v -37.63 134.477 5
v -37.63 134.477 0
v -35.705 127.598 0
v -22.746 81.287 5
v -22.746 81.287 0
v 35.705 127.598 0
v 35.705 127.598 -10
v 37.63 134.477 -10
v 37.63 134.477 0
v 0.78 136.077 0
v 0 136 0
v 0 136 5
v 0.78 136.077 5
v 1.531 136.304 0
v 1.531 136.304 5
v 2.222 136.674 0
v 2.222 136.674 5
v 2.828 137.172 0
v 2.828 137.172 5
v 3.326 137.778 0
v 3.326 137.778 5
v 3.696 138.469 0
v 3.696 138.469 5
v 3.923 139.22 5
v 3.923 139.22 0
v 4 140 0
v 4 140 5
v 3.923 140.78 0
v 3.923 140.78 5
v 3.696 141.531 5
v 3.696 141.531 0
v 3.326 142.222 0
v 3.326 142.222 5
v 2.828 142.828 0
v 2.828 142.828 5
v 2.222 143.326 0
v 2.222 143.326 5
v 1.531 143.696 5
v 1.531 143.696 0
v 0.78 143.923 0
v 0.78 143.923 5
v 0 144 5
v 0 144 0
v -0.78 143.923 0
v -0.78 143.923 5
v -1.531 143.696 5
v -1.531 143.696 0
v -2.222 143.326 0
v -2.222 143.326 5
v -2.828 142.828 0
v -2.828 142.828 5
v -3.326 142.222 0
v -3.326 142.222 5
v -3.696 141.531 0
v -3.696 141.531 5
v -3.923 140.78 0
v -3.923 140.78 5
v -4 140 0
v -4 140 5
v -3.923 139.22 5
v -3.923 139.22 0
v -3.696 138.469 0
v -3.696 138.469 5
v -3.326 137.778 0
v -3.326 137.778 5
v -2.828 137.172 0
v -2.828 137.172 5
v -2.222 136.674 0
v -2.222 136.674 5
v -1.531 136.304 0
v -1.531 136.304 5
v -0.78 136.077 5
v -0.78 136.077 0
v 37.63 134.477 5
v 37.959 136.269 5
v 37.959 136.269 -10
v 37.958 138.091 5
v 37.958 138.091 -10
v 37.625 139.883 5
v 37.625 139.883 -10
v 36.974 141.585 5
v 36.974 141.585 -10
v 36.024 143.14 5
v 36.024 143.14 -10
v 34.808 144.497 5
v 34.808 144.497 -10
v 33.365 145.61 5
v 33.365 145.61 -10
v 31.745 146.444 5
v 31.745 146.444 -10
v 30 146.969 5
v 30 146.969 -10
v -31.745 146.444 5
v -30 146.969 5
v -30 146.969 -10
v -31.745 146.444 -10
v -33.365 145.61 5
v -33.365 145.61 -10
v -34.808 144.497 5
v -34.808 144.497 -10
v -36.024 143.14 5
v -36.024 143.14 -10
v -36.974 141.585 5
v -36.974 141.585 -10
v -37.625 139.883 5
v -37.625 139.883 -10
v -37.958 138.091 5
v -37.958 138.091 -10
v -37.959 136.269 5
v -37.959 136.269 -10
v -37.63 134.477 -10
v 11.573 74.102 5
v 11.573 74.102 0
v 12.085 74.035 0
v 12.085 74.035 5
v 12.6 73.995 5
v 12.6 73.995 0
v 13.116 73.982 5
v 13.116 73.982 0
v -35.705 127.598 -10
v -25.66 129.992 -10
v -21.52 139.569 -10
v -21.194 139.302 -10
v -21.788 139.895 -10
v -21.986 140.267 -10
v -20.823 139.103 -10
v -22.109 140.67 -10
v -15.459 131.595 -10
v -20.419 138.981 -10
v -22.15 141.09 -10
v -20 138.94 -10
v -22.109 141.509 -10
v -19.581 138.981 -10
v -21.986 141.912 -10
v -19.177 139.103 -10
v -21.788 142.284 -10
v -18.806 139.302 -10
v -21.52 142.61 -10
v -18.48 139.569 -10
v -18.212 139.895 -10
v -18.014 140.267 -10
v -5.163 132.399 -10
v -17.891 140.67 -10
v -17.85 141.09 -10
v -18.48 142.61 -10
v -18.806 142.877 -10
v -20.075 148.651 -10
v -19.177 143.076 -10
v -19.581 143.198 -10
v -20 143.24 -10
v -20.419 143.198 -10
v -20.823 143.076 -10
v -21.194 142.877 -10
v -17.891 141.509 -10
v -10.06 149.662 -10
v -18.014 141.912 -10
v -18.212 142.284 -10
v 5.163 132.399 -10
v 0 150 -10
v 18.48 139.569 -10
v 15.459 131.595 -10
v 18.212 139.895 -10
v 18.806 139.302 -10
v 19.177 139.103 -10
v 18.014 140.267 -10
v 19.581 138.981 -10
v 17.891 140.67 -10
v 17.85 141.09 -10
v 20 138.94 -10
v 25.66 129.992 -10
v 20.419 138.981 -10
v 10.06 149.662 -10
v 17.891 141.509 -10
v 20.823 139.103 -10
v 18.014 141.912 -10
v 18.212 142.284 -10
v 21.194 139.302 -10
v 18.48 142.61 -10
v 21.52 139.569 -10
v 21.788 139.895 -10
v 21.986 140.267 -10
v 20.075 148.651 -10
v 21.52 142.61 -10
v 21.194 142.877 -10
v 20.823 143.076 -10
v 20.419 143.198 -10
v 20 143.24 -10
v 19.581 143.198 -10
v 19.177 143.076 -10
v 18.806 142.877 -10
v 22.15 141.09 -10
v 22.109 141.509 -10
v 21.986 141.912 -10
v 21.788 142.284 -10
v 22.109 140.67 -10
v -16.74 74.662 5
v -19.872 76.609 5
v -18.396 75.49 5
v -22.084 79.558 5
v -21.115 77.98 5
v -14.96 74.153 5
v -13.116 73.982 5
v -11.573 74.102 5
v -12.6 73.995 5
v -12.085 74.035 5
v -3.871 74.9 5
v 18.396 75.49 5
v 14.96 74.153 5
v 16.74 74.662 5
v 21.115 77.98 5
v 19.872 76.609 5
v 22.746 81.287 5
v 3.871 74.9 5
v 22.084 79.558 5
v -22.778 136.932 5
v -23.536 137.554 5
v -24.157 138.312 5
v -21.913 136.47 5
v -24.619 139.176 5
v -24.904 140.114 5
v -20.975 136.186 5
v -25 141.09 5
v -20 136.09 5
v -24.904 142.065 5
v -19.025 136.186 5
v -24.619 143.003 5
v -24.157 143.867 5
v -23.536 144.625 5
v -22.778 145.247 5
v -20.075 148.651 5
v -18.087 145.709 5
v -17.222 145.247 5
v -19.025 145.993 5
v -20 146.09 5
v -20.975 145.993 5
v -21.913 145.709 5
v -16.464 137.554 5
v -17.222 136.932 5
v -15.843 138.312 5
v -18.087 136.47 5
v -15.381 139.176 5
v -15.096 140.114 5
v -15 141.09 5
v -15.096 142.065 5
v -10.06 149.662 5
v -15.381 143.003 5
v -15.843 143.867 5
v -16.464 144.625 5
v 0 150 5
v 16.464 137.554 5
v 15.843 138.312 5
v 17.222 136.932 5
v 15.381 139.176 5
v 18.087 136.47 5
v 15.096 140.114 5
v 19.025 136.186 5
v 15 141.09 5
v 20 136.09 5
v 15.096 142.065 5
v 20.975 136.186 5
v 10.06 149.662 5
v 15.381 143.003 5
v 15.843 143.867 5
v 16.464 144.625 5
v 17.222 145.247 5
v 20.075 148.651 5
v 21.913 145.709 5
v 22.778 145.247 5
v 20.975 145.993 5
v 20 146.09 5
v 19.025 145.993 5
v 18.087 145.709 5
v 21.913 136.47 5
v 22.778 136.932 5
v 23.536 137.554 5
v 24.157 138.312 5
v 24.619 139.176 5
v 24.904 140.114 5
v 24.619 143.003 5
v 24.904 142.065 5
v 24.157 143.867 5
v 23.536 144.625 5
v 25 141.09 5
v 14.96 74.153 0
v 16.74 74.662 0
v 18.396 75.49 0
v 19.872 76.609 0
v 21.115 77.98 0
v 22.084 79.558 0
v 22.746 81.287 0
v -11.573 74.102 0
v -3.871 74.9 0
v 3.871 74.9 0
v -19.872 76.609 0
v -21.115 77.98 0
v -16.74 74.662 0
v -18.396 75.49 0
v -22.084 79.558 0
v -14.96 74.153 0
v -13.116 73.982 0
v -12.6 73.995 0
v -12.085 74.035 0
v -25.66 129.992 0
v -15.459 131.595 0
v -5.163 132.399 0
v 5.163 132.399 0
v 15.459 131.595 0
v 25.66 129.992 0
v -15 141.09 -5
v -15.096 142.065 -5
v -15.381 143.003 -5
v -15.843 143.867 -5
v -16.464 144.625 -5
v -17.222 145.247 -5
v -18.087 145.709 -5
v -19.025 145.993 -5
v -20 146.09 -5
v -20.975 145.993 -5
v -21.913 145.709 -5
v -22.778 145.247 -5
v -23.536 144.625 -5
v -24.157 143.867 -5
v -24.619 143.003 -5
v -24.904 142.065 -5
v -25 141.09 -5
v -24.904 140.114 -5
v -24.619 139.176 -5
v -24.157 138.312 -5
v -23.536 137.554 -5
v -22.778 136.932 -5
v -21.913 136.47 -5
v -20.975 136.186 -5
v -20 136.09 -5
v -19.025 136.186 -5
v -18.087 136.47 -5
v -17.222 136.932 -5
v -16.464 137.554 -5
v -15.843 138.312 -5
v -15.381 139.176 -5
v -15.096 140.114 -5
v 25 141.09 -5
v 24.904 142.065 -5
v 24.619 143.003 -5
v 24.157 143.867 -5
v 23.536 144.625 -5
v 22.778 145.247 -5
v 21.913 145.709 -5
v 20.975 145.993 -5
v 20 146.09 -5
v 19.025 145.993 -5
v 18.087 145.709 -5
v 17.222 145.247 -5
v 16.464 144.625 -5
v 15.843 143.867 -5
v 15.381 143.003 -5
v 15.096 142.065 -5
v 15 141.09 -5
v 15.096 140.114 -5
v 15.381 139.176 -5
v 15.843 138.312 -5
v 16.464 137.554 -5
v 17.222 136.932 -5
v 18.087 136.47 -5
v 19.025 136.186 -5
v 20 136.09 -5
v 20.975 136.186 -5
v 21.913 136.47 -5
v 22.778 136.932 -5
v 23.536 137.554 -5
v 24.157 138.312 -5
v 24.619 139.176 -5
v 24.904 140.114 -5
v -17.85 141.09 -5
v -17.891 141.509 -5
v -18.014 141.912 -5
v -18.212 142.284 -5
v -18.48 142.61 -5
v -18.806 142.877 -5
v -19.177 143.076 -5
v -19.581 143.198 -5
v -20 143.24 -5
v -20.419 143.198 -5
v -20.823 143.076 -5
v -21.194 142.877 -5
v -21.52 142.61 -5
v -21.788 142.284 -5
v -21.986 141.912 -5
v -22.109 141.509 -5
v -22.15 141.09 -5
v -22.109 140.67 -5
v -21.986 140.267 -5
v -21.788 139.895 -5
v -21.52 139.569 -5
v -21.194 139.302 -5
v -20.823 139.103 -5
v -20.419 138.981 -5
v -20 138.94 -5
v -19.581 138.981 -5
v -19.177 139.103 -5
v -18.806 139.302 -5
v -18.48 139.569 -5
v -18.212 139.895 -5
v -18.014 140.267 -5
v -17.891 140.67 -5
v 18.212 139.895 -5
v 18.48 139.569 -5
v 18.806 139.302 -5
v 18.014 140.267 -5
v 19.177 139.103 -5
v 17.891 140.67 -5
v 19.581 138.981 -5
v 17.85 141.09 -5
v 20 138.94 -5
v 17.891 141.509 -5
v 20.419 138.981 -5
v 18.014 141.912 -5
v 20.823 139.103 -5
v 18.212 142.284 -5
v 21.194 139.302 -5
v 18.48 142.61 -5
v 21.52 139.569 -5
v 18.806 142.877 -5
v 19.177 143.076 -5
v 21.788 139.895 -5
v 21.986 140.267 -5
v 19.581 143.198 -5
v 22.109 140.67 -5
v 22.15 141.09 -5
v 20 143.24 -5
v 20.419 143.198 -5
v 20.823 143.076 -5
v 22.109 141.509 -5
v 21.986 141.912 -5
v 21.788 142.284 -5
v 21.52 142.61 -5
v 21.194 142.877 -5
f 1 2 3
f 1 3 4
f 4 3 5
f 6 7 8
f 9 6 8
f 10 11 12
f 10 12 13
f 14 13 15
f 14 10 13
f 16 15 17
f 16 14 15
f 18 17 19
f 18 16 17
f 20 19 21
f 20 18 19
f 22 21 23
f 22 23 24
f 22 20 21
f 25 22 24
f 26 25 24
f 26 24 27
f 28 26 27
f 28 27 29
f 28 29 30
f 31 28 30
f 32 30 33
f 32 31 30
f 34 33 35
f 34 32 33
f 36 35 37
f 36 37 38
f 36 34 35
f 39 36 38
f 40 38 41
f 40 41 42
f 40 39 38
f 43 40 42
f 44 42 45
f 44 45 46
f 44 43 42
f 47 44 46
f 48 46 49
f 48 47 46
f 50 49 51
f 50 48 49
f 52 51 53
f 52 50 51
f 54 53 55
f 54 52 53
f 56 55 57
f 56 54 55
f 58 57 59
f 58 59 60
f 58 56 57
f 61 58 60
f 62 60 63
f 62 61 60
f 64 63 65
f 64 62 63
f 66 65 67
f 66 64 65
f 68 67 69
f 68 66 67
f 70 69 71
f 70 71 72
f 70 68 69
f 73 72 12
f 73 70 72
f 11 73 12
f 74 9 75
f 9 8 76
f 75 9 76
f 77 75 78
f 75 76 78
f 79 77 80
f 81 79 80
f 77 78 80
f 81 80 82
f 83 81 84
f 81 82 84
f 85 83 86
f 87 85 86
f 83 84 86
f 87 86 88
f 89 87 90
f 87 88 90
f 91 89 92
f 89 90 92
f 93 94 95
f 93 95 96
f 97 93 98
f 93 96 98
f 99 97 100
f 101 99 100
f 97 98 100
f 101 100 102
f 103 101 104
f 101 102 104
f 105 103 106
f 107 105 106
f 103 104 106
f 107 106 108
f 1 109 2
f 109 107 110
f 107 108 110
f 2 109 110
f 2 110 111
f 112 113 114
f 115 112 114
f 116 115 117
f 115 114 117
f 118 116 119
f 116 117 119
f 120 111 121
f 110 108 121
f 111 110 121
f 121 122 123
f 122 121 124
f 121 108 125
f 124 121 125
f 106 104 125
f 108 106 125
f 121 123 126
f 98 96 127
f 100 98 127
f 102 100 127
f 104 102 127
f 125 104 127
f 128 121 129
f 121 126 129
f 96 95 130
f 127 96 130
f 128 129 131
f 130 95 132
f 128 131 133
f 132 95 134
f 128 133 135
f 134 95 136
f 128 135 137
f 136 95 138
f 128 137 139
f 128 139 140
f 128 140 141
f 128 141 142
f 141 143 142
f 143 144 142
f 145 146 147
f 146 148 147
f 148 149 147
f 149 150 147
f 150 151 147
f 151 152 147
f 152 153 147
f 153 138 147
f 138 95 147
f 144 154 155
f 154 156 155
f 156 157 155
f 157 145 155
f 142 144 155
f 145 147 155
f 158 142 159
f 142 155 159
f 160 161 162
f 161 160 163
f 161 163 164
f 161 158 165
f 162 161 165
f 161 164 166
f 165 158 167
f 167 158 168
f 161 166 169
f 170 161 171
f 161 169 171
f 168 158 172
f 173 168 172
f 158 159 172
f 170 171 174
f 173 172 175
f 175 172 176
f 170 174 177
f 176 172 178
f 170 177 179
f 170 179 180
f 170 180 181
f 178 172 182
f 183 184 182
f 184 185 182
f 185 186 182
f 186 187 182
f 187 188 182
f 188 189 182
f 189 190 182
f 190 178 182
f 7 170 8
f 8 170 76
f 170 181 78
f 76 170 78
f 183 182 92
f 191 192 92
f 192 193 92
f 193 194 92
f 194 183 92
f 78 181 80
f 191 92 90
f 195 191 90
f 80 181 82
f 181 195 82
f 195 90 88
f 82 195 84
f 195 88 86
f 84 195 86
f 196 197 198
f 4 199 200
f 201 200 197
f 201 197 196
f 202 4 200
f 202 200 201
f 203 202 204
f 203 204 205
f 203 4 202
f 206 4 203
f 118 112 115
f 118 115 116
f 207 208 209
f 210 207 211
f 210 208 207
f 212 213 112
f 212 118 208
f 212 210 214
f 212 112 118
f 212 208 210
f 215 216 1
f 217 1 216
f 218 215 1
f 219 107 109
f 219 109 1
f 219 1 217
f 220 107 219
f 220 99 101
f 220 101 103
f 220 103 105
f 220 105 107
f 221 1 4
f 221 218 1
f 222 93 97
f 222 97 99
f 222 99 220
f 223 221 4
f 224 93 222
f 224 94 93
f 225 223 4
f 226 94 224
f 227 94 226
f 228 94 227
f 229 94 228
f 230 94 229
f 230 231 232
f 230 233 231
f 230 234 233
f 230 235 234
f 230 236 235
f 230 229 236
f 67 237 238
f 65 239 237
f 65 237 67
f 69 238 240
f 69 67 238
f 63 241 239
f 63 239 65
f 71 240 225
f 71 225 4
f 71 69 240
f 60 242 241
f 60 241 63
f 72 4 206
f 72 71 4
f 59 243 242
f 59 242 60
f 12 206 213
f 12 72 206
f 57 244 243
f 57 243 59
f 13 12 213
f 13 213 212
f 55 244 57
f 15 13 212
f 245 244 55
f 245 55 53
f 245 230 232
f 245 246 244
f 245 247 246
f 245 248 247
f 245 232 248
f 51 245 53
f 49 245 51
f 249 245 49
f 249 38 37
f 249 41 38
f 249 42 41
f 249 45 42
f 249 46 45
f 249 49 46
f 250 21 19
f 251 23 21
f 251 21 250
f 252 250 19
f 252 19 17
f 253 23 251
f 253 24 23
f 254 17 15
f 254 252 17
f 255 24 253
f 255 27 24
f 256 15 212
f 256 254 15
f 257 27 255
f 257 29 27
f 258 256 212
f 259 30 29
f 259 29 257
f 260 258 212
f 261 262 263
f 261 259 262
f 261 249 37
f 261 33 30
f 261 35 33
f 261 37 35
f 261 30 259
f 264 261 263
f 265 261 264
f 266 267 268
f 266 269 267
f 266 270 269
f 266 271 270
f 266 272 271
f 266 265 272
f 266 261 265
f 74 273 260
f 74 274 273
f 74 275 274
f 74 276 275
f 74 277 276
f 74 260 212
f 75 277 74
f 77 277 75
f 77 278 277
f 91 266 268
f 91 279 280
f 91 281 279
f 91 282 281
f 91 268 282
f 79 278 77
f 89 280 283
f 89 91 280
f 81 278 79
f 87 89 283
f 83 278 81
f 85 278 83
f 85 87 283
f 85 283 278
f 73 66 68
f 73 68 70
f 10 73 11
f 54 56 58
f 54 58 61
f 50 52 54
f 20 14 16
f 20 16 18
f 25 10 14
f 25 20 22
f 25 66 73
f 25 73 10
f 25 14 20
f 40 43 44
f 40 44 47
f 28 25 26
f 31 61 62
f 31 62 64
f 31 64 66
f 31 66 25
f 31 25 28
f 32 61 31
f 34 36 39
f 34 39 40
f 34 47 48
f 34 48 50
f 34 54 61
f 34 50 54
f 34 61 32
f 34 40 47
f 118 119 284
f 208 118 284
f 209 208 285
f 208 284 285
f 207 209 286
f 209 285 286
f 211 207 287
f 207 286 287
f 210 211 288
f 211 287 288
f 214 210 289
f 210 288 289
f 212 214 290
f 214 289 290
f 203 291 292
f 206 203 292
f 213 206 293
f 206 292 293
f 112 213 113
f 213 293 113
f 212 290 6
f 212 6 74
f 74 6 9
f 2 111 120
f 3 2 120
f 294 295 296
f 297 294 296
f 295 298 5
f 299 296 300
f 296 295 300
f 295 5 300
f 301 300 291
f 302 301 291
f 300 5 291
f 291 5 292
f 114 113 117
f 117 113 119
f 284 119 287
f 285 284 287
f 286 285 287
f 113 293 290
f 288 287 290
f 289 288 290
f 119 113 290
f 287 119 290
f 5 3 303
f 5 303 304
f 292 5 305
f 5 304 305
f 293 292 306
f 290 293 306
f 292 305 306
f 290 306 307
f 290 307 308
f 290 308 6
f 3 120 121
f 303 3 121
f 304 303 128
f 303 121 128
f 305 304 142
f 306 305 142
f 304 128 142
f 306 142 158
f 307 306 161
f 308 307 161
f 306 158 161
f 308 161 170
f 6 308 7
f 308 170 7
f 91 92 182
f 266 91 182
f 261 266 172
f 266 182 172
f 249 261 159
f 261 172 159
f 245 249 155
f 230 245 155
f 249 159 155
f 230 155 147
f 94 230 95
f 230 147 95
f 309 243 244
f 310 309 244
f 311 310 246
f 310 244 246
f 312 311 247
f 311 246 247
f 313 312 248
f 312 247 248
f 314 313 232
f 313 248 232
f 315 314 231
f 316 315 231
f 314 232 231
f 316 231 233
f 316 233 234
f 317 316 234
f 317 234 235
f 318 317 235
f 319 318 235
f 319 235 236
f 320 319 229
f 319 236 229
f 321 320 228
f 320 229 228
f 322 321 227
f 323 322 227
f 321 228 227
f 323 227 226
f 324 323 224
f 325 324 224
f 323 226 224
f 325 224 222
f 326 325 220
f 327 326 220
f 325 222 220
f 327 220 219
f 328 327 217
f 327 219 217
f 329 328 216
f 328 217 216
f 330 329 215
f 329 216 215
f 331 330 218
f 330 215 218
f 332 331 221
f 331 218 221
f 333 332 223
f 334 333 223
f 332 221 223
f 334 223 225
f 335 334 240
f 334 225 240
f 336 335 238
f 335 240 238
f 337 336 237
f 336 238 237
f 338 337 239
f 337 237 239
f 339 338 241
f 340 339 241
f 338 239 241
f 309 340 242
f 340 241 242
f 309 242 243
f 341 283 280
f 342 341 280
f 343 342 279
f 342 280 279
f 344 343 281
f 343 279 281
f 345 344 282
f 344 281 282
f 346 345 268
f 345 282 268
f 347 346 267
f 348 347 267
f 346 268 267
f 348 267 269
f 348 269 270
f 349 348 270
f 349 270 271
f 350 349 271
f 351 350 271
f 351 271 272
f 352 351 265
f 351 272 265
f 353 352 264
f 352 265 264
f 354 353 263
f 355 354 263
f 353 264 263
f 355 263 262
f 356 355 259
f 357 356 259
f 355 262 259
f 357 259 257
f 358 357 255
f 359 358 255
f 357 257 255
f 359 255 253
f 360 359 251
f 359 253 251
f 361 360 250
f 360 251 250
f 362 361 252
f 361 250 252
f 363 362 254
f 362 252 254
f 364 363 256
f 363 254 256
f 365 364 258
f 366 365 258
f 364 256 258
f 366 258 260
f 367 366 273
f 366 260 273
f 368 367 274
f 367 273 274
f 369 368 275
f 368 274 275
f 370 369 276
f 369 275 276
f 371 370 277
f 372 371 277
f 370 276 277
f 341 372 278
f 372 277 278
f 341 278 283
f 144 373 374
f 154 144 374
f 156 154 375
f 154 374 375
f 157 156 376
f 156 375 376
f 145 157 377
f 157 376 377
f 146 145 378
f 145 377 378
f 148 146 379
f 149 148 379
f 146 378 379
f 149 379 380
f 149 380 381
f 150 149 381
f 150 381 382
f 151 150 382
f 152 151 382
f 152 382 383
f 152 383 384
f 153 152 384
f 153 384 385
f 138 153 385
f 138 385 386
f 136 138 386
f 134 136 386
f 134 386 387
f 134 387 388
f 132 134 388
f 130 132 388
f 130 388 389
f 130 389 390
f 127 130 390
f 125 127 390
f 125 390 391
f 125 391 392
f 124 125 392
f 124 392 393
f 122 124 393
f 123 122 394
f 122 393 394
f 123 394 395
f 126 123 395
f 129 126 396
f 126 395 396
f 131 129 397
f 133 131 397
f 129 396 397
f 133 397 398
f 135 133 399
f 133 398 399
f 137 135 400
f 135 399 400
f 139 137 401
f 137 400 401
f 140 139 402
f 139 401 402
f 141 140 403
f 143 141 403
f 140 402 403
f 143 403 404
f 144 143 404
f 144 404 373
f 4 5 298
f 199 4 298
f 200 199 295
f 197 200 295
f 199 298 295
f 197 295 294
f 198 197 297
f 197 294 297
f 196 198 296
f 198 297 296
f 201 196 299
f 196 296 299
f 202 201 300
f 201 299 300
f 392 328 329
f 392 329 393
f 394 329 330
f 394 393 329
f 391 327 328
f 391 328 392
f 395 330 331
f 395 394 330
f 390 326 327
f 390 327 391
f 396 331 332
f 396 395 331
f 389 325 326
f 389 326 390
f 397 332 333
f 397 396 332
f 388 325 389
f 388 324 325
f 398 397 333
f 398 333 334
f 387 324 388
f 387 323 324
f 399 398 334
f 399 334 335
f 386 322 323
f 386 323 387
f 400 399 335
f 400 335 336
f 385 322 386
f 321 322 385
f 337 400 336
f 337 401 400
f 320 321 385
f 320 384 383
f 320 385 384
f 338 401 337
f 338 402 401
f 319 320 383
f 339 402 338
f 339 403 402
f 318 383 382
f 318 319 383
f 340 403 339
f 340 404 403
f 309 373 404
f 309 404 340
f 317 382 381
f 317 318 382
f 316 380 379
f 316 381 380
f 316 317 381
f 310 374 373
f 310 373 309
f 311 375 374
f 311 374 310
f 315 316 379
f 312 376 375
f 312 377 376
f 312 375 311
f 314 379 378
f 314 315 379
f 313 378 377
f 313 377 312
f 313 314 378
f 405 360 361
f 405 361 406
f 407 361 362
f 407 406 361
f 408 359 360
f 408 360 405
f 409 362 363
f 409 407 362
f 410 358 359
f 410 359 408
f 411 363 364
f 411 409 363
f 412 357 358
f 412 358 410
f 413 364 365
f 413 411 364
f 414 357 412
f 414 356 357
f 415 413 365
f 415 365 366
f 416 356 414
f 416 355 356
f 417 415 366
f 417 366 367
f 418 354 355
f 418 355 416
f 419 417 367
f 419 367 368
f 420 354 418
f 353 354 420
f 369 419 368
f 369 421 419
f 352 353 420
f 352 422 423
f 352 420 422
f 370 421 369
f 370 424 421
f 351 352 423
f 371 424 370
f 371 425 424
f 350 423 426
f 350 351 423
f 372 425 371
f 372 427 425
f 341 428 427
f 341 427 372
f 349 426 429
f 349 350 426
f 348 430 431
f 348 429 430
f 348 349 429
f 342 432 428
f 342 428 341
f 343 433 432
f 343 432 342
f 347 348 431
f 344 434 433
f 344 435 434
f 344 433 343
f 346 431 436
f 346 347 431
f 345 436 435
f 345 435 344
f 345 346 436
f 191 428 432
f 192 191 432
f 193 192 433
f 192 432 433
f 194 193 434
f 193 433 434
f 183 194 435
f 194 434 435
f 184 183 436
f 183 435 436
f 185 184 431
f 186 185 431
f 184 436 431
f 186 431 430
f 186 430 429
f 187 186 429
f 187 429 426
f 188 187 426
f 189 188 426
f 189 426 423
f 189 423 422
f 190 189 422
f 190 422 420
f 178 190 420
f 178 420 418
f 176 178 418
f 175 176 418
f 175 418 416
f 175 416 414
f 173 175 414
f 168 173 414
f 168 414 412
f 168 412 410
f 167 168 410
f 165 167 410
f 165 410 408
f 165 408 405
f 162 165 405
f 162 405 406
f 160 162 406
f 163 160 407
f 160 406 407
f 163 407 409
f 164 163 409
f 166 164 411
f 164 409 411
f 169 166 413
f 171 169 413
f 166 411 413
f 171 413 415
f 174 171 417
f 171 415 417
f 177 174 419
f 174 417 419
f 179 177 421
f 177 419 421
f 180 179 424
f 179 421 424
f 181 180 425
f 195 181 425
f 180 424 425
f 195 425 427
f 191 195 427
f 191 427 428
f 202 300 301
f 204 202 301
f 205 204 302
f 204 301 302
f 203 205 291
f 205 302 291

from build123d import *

# Parameters (mm, degrees)
EXTRUDE_1_DEPTH     = 5
EXTRUDE_START       = 10
EXTRUDE_2_DEPTH     = 10
SKETCH_3_R          = 2.15
CUT_EXTRUDE_1_DEPTH = 50
SKETCH_4_R          = 5
CUT_EXTRUDE_2_DEPTH = 10


with BuildPart() as part:
    # 草图1 → 凸台-拉伸1 (new body)
    with BuildSketch(Plane.XY):
        with BuildLine():
            Line((-37.630075072, 134.476679949), (-22.746271228, 81.287189306))
            ThreePointArc((-22.746271228, 81.287189306), (-19.159893018, 76.014894835), (-13.116196156, 73.981934953))
            ThreePointArc((-13.116196156, 73.981934953), (-12.342334545, 74.011923006), (-11.573114255, 74.101707311))
            ThreePointArc((-11.573114255, 74.101707311), (0, 75), (11.573114255, 74.101707311))
            ThreePointArc((11.573114255, 74.101707311), (12.342334545, 74.011923006), (13.116196156, 73.981934953))
            ThreePointArc((13.116196156, 73.981934953), (19.159893018, 76.014894835), (22.746271228, 81.287189306))
            Line((22.746271228, 81.287189306), (37.630075072, 134.476679949))
            ThreePointArc((37.630075072, 134.476679949), (36.534141944, 142.38375917), (30, 146.969384567))
            ThreePointArc((30, 146.969384567), (0, 150), (-30, 146.969384567))
            ThreePointArc((-30, 146.969384567), (-36.534141944, 142.38375917), (-37.630075072, 134.476679949))
        make_face()
        with BuildLine():
            ThreePointArc((0, 144), (-4, 140), (0, 136))
            ThreePointArc((0, 136), (4, 140), (0, 144))
        make_face(mode=Mode.SUBTRACT)
    extrude(amount=EXTRUDE_1_DEPTH)

    # 草图2 → 凸台-拉伸2 (add)
    with BuildSketch(Plane(origin=(0, 0, 0), x_dir=(-1, 0, 0), z_dir=(0, 0, -1)).offset(EXTRUDE_START)):
        with BuildLine():
            Line((37.630075072, 134.476679949), (35.705379823, 127.598494708))
            ThreePointArc((35.705379823, 127.598494708), (0, 132.5), (-35.705379823, 127.598494708))
            Line((-35.705379823, 127.598494708), (-37.630075072, 134.476679949))
            ThreePointArc((-37.630075072, 134.476679949), (-36.534141944, 142.38375917), (-30, 146.969384567))
            ThreePointArc((-30, 146.969384567), (0, 150), (30, 146.969384567))
            ThreePointArc((30, 146.969384567), (36.534141944, 142.38375917), (37.630075072, 134.476679949))
        make_face()
    extrude(amount=-EXTRUDE_2_DEPTH)

    # 草图3 → 切除-拉伸1 (cut)
    with BuildSketch(Plane.XY.offset(5)):
        with Locations((-20, 141.089510595)):
            Circle(SKETCH_3_R)
        with Locations((20, 141.089510595)):
            Circle(SKETCH_3_R)
    extrude(amount=-CUT_EXTRUDE_1_DEPTH, mode=Mode.SUBTRACT)

    # 草图4 → 切除-拉伸2 (cut)
    with BuildSketch(Plane.XY.offset(5)):
        with Locations((-20, 141.089510595)):
            Circle(SKETCH_4_R)
        with Locations((20, 141.089510595)):
            Circle(SKETCH_4_R)
    extrude(amount=-CUT_EXTRUDE_2_DEPTH, mode=Mode.SUBTRACT)


solid = part.part
